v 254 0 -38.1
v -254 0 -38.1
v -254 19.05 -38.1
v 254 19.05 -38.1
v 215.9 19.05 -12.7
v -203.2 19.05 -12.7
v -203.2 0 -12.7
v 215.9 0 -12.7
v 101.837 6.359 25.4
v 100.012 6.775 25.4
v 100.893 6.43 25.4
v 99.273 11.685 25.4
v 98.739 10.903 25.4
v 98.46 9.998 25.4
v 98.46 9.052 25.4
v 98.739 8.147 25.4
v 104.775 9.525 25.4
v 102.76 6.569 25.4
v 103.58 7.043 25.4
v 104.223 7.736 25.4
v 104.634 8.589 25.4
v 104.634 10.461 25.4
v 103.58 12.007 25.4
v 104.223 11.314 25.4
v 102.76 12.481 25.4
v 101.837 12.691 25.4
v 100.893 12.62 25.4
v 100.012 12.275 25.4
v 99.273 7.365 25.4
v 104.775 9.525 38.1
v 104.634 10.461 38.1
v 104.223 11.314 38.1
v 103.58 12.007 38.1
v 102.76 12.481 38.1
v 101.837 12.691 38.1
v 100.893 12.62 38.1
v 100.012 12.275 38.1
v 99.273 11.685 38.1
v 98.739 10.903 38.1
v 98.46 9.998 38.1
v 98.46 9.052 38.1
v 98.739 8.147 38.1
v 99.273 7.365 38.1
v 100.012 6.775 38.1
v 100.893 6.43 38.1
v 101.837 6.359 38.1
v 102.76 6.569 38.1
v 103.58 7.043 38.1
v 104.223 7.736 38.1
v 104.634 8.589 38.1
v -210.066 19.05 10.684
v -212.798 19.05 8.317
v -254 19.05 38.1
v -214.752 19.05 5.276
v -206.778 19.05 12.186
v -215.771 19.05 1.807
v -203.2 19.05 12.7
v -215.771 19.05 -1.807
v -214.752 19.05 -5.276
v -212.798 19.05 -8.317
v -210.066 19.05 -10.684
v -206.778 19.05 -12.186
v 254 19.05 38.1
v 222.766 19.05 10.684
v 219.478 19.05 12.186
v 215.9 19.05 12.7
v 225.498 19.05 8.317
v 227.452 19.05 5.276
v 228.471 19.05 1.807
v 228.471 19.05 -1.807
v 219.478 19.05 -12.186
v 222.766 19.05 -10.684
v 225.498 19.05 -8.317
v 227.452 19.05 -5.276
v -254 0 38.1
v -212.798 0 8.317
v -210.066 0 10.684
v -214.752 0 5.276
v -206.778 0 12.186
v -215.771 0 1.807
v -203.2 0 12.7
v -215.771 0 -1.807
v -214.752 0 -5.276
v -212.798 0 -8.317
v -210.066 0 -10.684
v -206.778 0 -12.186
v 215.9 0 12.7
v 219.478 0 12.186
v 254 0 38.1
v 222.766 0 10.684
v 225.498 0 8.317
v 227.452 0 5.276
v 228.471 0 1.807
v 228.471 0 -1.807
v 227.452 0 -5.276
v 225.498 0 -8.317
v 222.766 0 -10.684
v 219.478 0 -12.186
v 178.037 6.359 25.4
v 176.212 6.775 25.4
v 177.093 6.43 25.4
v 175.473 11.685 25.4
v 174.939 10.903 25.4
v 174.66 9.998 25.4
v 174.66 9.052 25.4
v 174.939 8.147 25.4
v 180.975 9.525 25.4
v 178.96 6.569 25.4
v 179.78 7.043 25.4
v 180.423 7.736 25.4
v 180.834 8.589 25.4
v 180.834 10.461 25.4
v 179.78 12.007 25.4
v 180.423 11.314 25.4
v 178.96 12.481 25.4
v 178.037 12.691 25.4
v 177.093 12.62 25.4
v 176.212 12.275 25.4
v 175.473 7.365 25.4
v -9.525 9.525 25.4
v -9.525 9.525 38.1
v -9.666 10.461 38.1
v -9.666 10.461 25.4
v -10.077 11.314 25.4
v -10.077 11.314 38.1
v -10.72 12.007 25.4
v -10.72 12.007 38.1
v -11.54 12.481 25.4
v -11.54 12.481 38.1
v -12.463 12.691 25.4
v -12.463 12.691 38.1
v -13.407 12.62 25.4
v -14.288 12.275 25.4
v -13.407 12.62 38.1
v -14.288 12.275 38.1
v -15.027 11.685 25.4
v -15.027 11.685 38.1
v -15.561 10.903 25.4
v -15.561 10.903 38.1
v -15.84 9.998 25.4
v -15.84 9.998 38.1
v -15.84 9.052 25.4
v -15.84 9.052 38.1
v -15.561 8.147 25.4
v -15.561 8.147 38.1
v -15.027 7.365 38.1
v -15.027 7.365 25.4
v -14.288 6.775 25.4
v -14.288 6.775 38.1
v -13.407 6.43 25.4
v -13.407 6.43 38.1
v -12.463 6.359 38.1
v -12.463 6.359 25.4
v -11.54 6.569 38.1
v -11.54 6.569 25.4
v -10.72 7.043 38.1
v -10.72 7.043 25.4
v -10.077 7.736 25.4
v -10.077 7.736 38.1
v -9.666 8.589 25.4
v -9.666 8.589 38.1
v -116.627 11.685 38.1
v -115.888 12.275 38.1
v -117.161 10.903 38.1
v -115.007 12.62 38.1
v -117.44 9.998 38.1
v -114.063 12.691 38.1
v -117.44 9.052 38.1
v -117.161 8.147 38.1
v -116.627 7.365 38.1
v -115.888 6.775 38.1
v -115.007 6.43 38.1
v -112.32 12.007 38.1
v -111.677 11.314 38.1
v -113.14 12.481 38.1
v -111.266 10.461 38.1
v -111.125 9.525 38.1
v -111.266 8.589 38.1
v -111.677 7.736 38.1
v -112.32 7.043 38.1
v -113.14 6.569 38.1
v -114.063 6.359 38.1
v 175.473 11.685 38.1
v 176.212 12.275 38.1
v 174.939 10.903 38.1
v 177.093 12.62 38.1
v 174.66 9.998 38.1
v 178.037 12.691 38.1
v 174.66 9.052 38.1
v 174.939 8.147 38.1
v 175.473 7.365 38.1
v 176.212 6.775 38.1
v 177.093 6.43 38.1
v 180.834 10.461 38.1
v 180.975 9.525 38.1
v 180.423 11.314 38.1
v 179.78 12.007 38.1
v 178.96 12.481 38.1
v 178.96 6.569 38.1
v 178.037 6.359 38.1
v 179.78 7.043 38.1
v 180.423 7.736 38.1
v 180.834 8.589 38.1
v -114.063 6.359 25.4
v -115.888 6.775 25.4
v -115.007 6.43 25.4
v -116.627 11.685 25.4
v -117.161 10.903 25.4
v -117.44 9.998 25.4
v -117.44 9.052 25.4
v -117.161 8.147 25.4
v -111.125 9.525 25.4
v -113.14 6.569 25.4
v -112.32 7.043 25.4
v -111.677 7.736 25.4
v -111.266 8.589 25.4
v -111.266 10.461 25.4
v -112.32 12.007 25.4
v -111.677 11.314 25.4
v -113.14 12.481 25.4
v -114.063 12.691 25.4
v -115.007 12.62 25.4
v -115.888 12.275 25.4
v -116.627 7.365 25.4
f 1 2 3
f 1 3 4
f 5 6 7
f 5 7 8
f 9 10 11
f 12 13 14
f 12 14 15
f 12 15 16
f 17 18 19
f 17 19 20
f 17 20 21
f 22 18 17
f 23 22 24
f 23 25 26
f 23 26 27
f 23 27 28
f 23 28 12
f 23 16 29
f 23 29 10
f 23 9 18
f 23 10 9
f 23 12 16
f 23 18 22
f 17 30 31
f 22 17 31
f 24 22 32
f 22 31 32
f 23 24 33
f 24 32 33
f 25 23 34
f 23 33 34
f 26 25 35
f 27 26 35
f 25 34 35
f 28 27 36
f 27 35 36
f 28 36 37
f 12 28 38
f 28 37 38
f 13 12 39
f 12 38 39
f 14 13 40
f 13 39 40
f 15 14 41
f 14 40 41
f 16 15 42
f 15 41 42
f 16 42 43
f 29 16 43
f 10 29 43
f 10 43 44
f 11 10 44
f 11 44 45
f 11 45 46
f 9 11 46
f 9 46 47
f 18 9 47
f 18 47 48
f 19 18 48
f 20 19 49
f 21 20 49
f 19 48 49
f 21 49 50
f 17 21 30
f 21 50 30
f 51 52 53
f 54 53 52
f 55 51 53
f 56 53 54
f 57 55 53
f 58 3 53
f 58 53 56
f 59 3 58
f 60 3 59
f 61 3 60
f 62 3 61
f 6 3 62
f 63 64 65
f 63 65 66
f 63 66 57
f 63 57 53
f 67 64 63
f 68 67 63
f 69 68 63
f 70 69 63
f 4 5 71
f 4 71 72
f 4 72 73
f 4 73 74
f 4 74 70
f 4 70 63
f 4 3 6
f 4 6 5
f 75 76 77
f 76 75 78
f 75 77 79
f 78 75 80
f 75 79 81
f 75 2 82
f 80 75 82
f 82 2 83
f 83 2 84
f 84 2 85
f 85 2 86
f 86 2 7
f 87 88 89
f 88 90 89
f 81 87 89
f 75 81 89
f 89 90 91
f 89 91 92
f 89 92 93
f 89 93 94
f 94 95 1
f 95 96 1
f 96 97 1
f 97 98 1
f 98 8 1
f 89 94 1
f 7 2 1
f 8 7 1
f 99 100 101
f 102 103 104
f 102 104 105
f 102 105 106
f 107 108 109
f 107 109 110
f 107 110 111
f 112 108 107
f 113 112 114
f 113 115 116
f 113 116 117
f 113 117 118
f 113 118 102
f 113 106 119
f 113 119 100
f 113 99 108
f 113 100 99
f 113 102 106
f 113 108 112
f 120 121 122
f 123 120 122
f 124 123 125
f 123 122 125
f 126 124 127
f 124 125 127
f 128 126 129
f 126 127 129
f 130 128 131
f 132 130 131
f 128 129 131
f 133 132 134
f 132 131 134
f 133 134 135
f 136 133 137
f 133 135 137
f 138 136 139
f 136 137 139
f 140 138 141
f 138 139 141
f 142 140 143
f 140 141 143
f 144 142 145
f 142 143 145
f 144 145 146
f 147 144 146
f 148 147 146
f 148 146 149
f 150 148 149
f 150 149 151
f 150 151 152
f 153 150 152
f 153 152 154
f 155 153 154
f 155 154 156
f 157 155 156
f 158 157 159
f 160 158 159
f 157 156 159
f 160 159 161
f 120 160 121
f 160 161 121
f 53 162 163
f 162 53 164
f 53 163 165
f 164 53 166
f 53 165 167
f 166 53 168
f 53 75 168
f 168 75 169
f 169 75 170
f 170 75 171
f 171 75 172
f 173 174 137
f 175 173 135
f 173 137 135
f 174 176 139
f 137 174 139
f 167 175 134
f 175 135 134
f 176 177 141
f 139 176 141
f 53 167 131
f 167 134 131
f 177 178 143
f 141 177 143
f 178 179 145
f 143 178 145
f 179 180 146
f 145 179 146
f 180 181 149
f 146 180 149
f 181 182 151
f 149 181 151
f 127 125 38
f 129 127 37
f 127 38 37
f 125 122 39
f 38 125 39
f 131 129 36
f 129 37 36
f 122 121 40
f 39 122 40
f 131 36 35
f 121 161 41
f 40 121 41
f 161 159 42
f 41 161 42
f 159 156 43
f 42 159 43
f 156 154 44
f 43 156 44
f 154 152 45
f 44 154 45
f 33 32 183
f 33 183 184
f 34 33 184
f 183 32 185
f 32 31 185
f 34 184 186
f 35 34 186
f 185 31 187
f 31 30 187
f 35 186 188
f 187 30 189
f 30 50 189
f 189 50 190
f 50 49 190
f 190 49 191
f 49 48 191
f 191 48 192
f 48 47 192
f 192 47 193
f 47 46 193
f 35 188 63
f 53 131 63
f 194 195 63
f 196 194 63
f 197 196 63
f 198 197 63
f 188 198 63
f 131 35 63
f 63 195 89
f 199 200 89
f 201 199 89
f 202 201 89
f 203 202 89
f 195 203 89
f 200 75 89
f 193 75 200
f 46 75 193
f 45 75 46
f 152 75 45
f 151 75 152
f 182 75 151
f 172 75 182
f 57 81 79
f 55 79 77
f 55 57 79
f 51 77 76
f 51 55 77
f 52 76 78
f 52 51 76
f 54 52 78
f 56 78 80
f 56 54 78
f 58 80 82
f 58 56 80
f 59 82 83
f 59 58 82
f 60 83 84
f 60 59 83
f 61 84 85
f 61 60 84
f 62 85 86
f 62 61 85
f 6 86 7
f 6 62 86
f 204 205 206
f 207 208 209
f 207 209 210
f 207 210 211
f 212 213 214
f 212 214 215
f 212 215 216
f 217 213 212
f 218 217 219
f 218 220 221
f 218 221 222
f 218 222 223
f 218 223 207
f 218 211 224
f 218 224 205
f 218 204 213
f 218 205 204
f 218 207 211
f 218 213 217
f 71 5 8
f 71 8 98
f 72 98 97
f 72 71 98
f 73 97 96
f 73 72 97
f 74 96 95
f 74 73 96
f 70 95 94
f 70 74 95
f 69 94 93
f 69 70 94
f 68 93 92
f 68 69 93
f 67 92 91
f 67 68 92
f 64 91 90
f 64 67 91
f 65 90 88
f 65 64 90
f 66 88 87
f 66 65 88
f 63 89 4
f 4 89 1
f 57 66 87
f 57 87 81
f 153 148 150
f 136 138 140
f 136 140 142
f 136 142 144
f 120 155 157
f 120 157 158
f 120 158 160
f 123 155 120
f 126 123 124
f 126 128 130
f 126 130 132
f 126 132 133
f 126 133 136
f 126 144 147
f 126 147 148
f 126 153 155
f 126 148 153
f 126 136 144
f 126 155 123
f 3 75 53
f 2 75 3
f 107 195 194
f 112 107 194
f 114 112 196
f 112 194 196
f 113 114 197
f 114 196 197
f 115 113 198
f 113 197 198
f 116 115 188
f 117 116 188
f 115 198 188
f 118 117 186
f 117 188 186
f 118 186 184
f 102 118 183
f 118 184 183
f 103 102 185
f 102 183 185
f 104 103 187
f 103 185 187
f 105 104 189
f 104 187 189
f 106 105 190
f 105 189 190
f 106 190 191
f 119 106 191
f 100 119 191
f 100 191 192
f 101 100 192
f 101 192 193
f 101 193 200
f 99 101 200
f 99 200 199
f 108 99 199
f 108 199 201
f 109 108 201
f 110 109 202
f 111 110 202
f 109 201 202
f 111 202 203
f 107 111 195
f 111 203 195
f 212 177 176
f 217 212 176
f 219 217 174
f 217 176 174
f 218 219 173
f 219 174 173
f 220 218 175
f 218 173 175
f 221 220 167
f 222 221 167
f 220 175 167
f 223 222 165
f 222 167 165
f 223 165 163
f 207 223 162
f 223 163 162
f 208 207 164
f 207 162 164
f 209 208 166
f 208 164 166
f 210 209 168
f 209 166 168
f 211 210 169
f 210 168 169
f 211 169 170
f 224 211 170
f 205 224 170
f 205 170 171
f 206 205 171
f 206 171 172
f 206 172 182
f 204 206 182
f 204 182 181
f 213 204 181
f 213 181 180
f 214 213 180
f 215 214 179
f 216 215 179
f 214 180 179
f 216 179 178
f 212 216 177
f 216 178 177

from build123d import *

# Parameters (mm, degrees)
SKETCH1_W           = 508
SKETCH1_H           = 76.2
BOSS_EXTRUDE1_DEPTH = 19.05
CUT_EXTRUDE1_DEPTH  = 20.05
SKETCH5_R           = 3.175
CUT_EXTRUDE3_DEPTH  = 12.7


with BuildPart() as part:
    # Sketch1 → Boss-Extrude1 (new body)
    with BuildSketch(Plane(origin=(0, 0, 0), x_dir=(1, 0, 0), z_dir=(0, 1, 0))):
        Rectangle(SKETCH1_W, SKETCH1_H)
    extrude(amount=BOSS_EXTRUDE1_DEPTH)

    # Sketch3 → Cut-Extrude1 (cut, through all)
    with BuildSketch(Plane(origin=(0, 19.05, 0), x_dir=(1, 0, 0), z_dir=(0, 1, 0))):
        with BuildLine():
            Line((-203.2, 12.7), (215.9, 12.7))
            ThreePointArc((215.9, 12.7), (228.6, 0), (215.9, -12.7))
            Line((215.9, -12.7), (-203.2, -12.7))
            ThreePointArc((-203.2, -12.7), (-215.9, 0), (-203.2, 12.7))
        make_face()
    extrude(amount=-CUT_EXTRUDE1_DEPTH, mode=Mode.SUBTRACT)

    # Sketch5 → Cut-Extrude3 (cut)
    with BuildSketch(Plane.XY.offset(38.1)):
        with Locations((-114.3, 9.525)):
            Circle(SKETCH5_R)
        with Locations((-12.7, 9.525)):
            Circle(SKETCH5_R)
        with Locations((101.6, 9.525)):
            Circle(SKETCH5_R)
        with Locations((177.8, 9.525)):
            Circle(SKETCH5_R)
    extrude(amount=-CUT_EXTRUDE3_DEPTH, mode=Mode.SUBTRACT)


solid = part.part
